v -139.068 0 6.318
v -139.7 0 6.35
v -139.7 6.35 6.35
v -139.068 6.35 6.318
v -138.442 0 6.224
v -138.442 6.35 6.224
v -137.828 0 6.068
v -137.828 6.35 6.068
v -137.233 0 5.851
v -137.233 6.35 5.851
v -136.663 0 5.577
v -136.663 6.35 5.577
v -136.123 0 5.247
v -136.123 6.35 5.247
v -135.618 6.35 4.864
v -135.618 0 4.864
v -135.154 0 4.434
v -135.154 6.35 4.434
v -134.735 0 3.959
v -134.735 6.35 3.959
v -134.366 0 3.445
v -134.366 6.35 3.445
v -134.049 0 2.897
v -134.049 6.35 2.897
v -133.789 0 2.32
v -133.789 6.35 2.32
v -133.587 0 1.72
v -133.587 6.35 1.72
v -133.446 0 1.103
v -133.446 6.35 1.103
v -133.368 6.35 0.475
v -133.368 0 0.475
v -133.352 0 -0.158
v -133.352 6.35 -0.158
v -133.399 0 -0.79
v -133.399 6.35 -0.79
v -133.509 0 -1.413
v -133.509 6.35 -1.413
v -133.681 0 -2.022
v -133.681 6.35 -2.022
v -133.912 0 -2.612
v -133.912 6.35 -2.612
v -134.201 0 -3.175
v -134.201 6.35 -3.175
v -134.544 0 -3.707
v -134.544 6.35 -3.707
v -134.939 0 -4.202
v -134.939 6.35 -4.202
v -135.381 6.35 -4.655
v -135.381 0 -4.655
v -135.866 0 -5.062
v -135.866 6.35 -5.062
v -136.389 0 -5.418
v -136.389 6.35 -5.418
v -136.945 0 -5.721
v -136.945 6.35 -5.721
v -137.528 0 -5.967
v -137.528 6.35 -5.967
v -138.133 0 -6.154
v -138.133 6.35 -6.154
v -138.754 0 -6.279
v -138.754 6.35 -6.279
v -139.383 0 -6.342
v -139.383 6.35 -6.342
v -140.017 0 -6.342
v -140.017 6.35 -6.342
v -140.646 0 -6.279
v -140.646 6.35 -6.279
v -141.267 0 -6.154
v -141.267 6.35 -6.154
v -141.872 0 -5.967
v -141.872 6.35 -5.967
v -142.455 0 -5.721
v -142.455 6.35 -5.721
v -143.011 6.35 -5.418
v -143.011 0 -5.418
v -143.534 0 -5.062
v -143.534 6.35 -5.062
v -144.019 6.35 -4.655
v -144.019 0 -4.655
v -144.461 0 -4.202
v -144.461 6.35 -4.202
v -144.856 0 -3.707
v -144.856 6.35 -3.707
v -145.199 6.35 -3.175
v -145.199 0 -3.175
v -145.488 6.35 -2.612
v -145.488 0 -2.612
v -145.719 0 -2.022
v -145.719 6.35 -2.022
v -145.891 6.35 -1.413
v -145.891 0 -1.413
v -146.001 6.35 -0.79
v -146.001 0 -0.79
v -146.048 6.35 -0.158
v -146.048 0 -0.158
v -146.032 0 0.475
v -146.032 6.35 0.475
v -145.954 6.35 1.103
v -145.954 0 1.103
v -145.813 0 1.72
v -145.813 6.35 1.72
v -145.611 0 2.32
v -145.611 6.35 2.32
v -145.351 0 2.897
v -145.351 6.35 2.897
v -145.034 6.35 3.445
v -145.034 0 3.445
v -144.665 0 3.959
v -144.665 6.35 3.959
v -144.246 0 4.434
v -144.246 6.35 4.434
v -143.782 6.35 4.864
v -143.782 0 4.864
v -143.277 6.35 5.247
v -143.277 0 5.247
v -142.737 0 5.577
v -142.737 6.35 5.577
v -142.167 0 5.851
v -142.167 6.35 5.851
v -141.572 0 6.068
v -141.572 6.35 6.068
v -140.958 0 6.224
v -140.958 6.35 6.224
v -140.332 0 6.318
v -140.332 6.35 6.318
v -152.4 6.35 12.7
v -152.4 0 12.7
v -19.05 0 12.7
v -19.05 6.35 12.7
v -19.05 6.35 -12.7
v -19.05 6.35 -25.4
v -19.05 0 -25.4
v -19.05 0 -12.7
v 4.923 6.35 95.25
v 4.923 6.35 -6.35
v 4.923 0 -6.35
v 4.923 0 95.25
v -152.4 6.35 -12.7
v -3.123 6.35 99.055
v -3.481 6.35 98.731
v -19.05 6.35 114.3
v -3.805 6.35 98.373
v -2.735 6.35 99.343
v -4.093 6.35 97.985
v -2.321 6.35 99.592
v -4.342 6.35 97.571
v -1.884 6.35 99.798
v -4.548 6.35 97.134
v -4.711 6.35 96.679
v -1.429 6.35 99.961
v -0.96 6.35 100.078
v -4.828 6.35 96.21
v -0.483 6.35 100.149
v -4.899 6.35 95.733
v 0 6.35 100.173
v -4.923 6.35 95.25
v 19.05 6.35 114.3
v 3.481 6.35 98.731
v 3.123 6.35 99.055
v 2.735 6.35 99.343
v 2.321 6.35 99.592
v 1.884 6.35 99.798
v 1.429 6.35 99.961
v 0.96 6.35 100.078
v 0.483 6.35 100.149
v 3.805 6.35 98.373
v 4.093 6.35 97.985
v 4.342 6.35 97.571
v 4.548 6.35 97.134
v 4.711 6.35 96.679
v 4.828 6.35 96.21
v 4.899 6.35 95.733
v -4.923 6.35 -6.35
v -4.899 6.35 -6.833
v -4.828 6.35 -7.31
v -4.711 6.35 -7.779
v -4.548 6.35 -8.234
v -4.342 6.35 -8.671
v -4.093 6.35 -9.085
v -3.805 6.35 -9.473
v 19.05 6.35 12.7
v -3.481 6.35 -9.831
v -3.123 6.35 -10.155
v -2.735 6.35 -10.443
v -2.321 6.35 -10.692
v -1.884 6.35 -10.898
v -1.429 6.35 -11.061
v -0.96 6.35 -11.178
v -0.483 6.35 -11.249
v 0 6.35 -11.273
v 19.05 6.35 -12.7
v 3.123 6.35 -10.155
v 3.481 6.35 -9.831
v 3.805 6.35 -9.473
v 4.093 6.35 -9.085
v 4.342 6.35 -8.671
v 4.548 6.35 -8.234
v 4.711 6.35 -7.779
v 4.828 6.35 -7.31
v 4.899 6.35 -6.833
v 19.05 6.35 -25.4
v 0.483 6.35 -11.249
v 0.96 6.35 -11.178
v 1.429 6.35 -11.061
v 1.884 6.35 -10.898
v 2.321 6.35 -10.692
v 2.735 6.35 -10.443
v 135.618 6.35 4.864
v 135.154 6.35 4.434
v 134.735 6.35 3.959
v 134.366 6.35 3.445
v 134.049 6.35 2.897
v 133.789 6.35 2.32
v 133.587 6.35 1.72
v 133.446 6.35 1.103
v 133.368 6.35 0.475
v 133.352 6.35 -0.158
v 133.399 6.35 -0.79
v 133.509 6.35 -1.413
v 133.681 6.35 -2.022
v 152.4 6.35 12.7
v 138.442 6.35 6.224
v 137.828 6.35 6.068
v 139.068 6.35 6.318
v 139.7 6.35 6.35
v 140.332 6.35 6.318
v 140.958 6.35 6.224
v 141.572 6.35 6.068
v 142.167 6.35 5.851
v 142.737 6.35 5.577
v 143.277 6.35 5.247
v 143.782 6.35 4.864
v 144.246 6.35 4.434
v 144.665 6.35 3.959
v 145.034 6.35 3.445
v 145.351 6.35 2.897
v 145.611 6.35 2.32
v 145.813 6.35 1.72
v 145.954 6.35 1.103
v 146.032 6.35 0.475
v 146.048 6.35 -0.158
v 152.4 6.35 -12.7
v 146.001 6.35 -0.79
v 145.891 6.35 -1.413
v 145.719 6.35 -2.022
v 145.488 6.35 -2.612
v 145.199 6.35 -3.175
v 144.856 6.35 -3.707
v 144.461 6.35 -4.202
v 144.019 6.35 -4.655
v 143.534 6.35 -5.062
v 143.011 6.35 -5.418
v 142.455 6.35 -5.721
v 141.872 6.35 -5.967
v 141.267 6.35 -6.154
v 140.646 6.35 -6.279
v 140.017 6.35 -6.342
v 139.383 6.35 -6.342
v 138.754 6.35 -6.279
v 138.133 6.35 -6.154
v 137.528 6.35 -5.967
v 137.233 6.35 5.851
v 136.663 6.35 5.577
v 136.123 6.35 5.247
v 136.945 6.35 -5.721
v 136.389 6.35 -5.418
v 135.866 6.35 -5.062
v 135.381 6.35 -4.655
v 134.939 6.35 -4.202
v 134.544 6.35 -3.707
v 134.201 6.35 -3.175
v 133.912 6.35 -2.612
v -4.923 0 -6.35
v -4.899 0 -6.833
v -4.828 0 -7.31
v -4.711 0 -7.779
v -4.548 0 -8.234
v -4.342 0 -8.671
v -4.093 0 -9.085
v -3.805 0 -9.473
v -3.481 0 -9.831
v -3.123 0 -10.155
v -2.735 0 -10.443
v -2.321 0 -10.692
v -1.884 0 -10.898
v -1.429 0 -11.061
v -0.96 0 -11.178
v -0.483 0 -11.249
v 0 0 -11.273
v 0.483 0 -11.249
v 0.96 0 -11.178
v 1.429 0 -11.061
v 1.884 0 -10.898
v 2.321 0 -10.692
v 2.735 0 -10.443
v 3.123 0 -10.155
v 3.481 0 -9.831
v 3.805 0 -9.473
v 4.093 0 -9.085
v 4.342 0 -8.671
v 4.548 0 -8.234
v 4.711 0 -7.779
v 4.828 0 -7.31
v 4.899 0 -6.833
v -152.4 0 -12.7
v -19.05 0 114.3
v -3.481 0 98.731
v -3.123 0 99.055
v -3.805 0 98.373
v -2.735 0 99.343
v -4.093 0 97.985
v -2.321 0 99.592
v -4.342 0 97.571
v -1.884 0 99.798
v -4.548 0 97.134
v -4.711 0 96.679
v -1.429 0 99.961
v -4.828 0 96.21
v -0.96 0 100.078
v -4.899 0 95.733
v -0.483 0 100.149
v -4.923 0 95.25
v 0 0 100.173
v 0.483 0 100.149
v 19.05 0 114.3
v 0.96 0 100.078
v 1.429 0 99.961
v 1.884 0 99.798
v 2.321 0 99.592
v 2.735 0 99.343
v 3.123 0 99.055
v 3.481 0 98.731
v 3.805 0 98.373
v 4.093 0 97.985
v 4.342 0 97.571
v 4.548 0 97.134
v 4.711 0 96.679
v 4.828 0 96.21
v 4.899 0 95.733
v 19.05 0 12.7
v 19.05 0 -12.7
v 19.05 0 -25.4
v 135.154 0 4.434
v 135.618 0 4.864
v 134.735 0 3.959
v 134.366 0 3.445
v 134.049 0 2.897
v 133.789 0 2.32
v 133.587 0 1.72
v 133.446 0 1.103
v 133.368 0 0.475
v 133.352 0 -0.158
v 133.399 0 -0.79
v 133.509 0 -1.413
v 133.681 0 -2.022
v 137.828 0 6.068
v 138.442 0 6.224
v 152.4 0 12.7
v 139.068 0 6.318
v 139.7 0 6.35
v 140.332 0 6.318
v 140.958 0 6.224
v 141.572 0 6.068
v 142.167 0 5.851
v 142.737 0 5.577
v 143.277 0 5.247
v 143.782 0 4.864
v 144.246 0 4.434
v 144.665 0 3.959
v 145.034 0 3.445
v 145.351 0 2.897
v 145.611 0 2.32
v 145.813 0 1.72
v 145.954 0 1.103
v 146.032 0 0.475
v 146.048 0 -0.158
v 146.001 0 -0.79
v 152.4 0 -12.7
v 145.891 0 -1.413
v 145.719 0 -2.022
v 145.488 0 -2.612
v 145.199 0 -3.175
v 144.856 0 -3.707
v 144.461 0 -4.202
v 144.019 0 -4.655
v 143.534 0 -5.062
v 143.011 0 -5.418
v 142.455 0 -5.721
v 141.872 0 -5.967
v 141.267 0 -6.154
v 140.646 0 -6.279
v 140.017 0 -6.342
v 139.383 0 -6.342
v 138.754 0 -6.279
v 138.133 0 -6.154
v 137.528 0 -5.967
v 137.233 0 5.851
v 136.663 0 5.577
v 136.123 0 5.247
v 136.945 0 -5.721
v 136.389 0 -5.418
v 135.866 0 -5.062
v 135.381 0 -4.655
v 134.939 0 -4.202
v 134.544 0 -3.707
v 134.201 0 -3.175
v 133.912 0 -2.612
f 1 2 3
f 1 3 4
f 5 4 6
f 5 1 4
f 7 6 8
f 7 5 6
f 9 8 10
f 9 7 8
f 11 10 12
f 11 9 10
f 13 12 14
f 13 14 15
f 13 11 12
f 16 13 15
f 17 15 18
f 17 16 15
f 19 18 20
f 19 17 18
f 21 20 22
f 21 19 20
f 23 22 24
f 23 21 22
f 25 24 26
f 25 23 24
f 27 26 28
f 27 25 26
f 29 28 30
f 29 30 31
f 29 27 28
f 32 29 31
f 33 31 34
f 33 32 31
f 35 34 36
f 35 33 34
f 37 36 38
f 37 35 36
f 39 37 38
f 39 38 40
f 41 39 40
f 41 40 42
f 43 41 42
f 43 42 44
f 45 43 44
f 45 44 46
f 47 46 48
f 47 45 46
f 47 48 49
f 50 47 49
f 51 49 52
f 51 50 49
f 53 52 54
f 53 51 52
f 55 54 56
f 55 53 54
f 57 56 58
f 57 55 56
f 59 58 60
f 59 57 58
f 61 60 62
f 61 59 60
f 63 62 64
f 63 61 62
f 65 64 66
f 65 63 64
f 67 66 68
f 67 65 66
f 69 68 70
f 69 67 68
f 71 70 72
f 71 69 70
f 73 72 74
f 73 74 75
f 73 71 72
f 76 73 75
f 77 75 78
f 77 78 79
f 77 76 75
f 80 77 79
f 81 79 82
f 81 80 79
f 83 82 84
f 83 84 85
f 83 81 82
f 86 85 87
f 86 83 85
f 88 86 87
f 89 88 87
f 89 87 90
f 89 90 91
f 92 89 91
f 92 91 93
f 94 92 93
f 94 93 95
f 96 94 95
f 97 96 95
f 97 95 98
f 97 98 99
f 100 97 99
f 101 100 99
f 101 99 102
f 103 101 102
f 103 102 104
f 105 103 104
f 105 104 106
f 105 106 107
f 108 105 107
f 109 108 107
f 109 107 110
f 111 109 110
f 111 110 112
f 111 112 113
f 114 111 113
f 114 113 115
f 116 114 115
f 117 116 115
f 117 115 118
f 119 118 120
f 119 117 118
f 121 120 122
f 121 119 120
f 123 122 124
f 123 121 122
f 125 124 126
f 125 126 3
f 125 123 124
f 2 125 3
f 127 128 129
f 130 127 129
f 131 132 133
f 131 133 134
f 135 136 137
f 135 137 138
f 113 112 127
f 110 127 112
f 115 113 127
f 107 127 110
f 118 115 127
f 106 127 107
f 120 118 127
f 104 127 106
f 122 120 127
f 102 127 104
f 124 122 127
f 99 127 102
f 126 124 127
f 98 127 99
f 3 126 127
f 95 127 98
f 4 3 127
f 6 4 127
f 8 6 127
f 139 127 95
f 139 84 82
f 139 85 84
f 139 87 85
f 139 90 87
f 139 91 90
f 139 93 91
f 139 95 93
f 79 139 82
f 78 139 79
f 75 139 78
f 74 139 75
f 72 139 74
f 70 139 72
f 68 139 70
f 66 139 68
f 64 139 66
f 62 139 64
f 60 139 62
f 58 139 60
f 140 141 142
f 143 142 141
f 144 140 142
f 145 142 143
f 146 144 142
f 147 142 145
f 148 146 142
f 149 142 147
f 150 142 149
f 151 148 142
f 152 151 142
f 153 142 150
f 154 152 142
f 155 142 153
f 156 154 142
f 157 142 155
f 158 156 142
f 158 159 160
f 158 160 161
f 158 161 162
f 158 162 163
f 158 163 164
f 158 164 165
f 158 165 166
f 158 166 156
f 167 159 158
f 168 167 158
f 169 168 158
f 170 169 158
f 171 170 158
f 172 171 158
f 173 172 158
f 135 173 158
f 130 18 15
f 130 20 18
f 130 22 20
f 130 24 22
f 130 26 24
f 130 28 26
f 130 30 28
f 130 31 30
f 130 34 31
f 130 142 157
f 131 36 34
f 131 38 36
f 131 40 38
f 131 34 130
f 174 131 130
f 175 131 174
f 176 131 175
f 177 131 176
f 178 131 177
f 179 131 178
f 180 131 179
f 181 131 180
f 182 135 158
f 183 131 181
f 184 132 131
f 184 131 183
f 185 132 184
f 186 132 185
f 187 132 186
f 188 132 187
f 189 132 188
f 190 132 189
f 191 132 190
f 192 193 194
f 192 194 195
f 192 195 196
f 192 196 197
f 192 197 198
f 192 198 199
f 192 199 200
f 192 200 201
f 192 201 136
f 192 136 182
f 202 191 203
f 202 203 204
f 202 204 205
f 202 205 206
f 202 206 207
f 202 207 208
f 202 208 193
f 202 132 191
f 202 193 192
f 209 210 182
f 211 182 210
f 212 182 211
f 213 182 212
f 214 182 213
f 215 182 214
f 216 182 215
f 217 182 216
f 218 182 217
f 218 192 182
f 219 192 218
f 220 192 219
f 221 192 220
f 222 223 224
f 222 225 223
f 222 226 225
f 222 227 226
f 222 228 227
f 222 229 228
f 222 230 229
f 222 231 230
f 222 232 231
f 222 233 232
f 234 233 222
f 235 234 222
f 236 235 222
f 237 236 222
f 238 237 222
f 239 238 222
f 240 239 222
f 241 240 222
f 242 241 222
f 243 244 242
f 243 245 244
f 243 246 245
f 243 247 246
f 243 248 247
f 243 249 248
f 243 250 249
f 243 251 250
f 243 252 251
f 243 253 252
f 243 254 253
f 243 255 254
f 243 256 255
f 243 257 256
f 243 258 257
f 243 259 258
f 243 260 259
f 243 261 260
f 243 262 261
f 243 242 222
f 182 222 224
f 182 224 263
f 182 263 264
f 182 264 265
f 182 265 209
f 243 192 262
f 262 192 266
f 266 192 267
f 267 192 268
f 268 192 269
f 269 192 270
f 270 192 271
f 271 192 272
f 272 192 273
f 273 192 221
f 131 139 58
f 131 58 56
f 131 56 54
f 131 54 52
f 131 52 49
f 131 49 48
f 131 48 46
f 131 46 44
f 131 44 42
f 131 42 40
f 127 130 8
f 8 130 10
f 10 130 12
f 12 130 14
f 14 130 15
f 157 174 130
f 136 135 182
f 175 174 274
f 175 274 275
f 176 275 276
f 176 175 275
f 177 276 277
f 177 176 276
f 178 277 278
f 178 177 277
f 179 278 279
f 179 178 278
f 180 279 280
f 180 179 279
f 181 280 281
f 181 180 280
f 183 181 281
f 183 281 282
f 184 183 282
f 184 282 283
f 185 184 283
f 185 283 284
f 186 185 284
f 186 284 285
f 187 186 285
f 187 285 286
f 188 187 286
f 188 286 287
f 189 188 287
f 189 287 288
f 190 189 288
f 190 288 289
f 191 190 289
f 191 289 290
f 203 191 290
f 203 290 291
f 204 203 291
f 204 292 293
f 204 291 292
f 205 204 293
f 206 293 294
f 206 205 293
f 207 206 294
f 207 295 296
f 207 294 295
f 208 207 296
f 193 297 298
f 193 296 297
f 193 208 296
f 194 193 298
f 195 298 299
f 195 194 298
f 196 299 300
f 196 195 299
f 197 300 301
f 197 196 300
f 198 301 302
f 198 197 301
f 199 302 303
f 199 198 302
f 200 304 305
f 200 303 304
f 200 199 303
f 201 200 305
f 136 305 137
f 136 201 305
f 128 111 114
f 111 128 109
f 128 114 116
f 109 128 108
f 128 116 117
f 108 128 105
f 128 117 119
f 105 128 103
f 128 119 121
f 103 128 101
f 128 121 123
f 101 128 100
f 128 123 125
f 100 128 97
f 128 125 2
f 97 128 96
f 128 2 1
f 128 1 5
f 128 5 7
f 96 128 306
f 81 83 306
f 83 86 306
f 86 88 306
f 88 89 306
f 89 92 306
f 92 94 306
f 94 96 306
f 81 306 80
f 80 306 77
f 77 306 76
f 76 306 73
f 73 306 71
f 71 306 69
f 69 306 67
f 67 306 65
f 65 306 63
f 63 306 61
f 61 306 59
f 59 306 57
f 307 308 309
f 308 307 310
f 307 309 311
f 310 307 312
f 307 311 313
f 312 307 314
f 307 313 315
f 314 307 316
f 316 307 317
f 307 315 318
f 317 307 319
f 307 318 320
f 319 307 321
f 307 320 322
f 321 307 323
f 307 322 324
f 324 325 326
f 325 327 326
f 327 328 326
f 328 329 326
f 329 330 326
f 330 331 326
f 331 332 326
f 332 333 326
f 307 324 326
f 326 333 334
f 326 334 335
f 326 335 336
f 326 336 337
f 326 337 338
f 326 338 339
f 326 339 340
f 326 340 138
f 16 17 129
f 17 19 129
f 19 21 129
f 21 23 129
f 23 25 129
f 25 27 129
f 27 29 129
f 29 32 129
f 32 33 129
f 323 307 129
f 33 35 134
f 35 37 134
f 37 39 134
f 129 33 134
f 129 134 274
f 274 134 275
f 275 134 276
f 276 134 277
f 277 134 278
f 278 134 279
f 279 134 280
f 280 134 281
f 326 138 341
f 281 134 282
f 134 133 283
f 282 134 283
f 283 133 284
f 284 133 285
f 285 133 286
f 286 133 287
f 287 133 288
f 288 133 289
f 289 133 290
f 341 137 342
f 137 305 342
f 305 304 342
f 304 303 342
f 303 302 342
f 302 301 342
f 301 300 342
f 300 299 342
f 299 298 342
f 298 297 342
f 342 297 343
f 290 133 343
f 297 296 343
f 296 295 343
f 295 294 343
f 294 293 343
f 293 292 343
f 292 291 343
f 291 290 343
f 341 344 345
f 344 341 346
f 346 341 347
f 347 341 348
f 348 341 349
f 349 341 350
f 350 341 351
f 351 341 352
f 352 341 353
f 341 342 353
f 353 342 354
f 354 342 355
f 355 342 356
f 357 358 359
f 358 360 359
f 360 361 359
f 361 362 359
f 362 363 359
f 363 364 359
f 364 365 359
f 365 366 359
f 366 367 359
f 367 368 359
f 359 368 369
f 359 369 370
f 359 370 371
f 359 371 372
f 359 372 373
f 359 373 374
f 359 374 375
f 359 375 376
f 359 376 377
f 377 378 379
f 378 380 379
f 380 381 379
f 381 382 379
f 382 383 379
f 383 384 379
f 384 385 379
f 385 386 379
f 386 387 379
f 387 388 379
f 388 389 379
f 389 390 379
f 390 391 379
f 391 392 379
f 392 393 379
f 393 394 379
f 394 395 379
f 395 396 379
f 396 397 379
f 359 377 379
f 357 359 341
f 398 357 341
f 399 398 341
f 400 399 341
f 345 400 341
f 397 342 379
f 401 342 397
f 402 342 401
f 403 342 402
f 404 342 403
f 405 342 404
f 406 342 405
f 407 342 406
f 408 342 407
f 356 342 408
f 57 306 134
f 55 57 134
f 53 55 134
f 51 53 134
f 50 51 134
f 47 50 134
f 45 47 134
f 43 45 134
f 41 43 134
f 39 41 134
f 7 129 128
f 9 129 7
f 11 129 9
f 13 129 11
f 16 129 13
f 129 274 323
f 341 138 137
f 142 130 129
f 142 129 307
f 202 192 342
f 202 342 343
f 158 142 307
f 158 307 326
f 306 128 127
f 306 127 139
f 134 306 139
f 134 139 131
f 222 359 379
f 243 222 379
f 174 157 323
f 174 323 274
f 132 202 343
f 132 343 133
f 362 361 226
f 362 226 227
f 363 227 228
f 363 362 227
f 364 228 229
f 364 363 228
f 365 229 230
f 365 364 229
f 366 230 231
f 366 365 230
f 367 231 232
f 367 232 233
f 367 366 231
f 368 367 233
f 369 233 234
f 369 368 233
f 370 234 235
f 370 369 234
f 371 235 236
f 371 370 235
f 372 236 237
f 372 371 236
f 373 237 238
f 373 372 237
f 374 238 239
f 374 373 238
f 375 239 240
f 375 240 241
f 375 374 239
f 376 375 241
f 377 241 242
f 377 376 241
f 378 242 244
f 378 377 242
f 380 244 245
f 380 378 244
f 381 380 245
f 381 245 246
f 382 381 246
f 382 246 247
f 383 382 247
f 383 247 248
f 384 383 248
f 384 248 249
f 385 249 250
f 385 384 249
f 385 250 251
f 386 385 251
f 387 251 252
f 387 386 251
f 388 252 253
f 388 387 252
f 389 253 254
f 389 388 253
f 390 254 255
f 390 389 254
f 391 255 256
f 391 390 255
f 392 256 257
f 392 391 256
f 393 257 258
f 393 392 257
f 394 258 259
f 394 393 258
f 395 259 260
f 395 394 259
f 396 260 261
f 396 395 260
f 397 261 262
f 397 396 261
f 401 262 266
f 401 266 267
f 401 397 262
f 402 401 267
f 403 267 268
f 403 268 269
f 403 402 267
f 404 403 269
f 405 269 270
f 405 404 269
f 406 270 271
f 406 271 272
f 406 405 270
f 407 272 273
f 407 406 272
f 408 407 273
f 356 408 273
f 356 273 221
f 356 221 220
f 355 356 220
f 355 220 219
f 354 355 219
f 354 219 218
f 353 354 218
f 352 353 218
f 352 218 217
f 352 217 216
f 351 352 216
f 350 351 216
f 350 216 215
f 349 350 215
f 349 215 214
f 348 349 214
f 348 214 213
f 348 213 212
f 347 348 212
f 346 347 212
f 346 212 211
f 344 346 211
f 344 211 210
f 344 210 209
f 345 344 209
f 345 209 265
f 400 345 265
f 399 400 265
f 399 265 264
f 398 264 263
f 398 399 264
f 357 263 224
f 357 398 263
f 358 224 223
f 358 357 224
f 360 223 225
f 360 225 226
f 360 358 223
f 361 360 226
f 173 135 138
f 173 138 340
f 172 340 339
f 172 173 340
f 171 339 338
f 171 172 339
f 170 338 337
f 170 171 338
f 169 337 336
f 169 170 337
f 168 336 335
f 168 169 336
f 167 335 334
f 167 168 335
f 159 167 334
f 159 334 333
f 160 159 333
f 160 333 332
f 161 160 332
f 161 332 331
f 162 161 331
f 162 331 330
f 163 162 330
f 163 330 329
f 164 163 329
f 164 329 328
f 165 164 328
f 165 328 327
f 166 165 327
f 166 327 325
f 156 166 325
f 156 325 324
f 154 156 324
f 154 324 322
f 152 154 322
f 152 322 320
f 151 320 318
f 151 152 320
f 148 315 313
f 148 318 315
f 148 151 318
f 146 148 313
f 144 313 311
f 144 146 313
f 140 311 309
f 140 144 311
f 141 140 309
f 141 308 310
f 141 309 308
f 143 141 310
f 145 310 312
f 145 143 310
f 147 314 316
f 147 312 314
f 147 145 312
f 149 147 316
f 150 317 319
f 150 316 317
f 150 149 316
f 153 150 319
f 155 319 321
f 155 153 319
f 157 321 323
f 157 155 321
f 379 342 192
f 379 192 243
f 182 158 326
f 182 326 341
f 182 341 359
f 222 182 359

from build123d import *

# Parameters (mm, degrees)
SKETCH1_W           = 304.8
SKETCH1_H           = 25.4
SKETCH1_R           = 6.35
BOSS_EXTRUDE1_DEPTH = 6.35
BOSS_EXTRUDE2_DEPTH = 6.35
CUT_EXTRUDE1_REACH  = 192.606


with BuildPart() as part:
    # Sketch1 → Boss-Extrude1 (new body)
    with BuildSketch(Plane(origin=(0, 0, 0), x_dir=(1, 0, 0), z_dir=(0, 1, 0))):
        Rectangle(SKETCH1_W, SKETCH1_H)
        with Locations(Location((-139.7, 0, 0), (0, 0, 270))):
            Circle(SKETCH1_R, mode=Mode.SUBTRACT)
        with Locations(Location((139.7, 0, 0), (0, 0, 270))):
            Circle(SKETCH1_R, mode=Mode.SUBTRACT)
    extrude(amount=BOSS_EXTRUDE1_DEPTH)

    # Sketch2 → Boss-Extrude2 (add)
    with BuildSketch(Plane(origin=(0, 6.35, 0), x_dir=(1, 0, 0), z_dir=(0, 1, 0))):
        Polygon((-19.05, -12.7), (-19.05, -114.3), (19.05, -114.3), (19.05, -12.7), (19.05, 25.4), (-19.05, 25.4), align=None)
    extrude(amount=-BOSS_EXTRUDE2_DEPTH)

    # Sketch3 → Cut-Extrude1 (cut, up to next)
    with BuildSketch(Plane(origin=(0, 6.35, 0), x_dir=(1, 0, 0), z_dir=(0, 1, 0)), mode=Mode.PRIVATE) as cut_extrude1_sk1:
        with BuildLine():
            Line((-4.922940563, -95.25), (-4.922940563, 6.35))
            ThreePointArc((-4.922940563, 6.35), (0, 11.272940563), (4.922940563, 6.35))
            Line((4.922940563, 6.35), (4.922940563, -95.25))
            ThreePointArc((4.922940563, -95.25), (0, -100.172940563), (-4.922940563, -95.25))
        make_face()
    cut_extrude1_tool1 = extrude(cut_extrude1_sk1.sketch, amount=-CUT_EXTRUDE1_REACH, mode=Mode.PRIVATE) & part.part
    add(cut_extrude1_tool1.solids().sort_by_distance((0, 6.35, 44.45))[0], mode=Mode.SUBTRACT)


solid = part.part
